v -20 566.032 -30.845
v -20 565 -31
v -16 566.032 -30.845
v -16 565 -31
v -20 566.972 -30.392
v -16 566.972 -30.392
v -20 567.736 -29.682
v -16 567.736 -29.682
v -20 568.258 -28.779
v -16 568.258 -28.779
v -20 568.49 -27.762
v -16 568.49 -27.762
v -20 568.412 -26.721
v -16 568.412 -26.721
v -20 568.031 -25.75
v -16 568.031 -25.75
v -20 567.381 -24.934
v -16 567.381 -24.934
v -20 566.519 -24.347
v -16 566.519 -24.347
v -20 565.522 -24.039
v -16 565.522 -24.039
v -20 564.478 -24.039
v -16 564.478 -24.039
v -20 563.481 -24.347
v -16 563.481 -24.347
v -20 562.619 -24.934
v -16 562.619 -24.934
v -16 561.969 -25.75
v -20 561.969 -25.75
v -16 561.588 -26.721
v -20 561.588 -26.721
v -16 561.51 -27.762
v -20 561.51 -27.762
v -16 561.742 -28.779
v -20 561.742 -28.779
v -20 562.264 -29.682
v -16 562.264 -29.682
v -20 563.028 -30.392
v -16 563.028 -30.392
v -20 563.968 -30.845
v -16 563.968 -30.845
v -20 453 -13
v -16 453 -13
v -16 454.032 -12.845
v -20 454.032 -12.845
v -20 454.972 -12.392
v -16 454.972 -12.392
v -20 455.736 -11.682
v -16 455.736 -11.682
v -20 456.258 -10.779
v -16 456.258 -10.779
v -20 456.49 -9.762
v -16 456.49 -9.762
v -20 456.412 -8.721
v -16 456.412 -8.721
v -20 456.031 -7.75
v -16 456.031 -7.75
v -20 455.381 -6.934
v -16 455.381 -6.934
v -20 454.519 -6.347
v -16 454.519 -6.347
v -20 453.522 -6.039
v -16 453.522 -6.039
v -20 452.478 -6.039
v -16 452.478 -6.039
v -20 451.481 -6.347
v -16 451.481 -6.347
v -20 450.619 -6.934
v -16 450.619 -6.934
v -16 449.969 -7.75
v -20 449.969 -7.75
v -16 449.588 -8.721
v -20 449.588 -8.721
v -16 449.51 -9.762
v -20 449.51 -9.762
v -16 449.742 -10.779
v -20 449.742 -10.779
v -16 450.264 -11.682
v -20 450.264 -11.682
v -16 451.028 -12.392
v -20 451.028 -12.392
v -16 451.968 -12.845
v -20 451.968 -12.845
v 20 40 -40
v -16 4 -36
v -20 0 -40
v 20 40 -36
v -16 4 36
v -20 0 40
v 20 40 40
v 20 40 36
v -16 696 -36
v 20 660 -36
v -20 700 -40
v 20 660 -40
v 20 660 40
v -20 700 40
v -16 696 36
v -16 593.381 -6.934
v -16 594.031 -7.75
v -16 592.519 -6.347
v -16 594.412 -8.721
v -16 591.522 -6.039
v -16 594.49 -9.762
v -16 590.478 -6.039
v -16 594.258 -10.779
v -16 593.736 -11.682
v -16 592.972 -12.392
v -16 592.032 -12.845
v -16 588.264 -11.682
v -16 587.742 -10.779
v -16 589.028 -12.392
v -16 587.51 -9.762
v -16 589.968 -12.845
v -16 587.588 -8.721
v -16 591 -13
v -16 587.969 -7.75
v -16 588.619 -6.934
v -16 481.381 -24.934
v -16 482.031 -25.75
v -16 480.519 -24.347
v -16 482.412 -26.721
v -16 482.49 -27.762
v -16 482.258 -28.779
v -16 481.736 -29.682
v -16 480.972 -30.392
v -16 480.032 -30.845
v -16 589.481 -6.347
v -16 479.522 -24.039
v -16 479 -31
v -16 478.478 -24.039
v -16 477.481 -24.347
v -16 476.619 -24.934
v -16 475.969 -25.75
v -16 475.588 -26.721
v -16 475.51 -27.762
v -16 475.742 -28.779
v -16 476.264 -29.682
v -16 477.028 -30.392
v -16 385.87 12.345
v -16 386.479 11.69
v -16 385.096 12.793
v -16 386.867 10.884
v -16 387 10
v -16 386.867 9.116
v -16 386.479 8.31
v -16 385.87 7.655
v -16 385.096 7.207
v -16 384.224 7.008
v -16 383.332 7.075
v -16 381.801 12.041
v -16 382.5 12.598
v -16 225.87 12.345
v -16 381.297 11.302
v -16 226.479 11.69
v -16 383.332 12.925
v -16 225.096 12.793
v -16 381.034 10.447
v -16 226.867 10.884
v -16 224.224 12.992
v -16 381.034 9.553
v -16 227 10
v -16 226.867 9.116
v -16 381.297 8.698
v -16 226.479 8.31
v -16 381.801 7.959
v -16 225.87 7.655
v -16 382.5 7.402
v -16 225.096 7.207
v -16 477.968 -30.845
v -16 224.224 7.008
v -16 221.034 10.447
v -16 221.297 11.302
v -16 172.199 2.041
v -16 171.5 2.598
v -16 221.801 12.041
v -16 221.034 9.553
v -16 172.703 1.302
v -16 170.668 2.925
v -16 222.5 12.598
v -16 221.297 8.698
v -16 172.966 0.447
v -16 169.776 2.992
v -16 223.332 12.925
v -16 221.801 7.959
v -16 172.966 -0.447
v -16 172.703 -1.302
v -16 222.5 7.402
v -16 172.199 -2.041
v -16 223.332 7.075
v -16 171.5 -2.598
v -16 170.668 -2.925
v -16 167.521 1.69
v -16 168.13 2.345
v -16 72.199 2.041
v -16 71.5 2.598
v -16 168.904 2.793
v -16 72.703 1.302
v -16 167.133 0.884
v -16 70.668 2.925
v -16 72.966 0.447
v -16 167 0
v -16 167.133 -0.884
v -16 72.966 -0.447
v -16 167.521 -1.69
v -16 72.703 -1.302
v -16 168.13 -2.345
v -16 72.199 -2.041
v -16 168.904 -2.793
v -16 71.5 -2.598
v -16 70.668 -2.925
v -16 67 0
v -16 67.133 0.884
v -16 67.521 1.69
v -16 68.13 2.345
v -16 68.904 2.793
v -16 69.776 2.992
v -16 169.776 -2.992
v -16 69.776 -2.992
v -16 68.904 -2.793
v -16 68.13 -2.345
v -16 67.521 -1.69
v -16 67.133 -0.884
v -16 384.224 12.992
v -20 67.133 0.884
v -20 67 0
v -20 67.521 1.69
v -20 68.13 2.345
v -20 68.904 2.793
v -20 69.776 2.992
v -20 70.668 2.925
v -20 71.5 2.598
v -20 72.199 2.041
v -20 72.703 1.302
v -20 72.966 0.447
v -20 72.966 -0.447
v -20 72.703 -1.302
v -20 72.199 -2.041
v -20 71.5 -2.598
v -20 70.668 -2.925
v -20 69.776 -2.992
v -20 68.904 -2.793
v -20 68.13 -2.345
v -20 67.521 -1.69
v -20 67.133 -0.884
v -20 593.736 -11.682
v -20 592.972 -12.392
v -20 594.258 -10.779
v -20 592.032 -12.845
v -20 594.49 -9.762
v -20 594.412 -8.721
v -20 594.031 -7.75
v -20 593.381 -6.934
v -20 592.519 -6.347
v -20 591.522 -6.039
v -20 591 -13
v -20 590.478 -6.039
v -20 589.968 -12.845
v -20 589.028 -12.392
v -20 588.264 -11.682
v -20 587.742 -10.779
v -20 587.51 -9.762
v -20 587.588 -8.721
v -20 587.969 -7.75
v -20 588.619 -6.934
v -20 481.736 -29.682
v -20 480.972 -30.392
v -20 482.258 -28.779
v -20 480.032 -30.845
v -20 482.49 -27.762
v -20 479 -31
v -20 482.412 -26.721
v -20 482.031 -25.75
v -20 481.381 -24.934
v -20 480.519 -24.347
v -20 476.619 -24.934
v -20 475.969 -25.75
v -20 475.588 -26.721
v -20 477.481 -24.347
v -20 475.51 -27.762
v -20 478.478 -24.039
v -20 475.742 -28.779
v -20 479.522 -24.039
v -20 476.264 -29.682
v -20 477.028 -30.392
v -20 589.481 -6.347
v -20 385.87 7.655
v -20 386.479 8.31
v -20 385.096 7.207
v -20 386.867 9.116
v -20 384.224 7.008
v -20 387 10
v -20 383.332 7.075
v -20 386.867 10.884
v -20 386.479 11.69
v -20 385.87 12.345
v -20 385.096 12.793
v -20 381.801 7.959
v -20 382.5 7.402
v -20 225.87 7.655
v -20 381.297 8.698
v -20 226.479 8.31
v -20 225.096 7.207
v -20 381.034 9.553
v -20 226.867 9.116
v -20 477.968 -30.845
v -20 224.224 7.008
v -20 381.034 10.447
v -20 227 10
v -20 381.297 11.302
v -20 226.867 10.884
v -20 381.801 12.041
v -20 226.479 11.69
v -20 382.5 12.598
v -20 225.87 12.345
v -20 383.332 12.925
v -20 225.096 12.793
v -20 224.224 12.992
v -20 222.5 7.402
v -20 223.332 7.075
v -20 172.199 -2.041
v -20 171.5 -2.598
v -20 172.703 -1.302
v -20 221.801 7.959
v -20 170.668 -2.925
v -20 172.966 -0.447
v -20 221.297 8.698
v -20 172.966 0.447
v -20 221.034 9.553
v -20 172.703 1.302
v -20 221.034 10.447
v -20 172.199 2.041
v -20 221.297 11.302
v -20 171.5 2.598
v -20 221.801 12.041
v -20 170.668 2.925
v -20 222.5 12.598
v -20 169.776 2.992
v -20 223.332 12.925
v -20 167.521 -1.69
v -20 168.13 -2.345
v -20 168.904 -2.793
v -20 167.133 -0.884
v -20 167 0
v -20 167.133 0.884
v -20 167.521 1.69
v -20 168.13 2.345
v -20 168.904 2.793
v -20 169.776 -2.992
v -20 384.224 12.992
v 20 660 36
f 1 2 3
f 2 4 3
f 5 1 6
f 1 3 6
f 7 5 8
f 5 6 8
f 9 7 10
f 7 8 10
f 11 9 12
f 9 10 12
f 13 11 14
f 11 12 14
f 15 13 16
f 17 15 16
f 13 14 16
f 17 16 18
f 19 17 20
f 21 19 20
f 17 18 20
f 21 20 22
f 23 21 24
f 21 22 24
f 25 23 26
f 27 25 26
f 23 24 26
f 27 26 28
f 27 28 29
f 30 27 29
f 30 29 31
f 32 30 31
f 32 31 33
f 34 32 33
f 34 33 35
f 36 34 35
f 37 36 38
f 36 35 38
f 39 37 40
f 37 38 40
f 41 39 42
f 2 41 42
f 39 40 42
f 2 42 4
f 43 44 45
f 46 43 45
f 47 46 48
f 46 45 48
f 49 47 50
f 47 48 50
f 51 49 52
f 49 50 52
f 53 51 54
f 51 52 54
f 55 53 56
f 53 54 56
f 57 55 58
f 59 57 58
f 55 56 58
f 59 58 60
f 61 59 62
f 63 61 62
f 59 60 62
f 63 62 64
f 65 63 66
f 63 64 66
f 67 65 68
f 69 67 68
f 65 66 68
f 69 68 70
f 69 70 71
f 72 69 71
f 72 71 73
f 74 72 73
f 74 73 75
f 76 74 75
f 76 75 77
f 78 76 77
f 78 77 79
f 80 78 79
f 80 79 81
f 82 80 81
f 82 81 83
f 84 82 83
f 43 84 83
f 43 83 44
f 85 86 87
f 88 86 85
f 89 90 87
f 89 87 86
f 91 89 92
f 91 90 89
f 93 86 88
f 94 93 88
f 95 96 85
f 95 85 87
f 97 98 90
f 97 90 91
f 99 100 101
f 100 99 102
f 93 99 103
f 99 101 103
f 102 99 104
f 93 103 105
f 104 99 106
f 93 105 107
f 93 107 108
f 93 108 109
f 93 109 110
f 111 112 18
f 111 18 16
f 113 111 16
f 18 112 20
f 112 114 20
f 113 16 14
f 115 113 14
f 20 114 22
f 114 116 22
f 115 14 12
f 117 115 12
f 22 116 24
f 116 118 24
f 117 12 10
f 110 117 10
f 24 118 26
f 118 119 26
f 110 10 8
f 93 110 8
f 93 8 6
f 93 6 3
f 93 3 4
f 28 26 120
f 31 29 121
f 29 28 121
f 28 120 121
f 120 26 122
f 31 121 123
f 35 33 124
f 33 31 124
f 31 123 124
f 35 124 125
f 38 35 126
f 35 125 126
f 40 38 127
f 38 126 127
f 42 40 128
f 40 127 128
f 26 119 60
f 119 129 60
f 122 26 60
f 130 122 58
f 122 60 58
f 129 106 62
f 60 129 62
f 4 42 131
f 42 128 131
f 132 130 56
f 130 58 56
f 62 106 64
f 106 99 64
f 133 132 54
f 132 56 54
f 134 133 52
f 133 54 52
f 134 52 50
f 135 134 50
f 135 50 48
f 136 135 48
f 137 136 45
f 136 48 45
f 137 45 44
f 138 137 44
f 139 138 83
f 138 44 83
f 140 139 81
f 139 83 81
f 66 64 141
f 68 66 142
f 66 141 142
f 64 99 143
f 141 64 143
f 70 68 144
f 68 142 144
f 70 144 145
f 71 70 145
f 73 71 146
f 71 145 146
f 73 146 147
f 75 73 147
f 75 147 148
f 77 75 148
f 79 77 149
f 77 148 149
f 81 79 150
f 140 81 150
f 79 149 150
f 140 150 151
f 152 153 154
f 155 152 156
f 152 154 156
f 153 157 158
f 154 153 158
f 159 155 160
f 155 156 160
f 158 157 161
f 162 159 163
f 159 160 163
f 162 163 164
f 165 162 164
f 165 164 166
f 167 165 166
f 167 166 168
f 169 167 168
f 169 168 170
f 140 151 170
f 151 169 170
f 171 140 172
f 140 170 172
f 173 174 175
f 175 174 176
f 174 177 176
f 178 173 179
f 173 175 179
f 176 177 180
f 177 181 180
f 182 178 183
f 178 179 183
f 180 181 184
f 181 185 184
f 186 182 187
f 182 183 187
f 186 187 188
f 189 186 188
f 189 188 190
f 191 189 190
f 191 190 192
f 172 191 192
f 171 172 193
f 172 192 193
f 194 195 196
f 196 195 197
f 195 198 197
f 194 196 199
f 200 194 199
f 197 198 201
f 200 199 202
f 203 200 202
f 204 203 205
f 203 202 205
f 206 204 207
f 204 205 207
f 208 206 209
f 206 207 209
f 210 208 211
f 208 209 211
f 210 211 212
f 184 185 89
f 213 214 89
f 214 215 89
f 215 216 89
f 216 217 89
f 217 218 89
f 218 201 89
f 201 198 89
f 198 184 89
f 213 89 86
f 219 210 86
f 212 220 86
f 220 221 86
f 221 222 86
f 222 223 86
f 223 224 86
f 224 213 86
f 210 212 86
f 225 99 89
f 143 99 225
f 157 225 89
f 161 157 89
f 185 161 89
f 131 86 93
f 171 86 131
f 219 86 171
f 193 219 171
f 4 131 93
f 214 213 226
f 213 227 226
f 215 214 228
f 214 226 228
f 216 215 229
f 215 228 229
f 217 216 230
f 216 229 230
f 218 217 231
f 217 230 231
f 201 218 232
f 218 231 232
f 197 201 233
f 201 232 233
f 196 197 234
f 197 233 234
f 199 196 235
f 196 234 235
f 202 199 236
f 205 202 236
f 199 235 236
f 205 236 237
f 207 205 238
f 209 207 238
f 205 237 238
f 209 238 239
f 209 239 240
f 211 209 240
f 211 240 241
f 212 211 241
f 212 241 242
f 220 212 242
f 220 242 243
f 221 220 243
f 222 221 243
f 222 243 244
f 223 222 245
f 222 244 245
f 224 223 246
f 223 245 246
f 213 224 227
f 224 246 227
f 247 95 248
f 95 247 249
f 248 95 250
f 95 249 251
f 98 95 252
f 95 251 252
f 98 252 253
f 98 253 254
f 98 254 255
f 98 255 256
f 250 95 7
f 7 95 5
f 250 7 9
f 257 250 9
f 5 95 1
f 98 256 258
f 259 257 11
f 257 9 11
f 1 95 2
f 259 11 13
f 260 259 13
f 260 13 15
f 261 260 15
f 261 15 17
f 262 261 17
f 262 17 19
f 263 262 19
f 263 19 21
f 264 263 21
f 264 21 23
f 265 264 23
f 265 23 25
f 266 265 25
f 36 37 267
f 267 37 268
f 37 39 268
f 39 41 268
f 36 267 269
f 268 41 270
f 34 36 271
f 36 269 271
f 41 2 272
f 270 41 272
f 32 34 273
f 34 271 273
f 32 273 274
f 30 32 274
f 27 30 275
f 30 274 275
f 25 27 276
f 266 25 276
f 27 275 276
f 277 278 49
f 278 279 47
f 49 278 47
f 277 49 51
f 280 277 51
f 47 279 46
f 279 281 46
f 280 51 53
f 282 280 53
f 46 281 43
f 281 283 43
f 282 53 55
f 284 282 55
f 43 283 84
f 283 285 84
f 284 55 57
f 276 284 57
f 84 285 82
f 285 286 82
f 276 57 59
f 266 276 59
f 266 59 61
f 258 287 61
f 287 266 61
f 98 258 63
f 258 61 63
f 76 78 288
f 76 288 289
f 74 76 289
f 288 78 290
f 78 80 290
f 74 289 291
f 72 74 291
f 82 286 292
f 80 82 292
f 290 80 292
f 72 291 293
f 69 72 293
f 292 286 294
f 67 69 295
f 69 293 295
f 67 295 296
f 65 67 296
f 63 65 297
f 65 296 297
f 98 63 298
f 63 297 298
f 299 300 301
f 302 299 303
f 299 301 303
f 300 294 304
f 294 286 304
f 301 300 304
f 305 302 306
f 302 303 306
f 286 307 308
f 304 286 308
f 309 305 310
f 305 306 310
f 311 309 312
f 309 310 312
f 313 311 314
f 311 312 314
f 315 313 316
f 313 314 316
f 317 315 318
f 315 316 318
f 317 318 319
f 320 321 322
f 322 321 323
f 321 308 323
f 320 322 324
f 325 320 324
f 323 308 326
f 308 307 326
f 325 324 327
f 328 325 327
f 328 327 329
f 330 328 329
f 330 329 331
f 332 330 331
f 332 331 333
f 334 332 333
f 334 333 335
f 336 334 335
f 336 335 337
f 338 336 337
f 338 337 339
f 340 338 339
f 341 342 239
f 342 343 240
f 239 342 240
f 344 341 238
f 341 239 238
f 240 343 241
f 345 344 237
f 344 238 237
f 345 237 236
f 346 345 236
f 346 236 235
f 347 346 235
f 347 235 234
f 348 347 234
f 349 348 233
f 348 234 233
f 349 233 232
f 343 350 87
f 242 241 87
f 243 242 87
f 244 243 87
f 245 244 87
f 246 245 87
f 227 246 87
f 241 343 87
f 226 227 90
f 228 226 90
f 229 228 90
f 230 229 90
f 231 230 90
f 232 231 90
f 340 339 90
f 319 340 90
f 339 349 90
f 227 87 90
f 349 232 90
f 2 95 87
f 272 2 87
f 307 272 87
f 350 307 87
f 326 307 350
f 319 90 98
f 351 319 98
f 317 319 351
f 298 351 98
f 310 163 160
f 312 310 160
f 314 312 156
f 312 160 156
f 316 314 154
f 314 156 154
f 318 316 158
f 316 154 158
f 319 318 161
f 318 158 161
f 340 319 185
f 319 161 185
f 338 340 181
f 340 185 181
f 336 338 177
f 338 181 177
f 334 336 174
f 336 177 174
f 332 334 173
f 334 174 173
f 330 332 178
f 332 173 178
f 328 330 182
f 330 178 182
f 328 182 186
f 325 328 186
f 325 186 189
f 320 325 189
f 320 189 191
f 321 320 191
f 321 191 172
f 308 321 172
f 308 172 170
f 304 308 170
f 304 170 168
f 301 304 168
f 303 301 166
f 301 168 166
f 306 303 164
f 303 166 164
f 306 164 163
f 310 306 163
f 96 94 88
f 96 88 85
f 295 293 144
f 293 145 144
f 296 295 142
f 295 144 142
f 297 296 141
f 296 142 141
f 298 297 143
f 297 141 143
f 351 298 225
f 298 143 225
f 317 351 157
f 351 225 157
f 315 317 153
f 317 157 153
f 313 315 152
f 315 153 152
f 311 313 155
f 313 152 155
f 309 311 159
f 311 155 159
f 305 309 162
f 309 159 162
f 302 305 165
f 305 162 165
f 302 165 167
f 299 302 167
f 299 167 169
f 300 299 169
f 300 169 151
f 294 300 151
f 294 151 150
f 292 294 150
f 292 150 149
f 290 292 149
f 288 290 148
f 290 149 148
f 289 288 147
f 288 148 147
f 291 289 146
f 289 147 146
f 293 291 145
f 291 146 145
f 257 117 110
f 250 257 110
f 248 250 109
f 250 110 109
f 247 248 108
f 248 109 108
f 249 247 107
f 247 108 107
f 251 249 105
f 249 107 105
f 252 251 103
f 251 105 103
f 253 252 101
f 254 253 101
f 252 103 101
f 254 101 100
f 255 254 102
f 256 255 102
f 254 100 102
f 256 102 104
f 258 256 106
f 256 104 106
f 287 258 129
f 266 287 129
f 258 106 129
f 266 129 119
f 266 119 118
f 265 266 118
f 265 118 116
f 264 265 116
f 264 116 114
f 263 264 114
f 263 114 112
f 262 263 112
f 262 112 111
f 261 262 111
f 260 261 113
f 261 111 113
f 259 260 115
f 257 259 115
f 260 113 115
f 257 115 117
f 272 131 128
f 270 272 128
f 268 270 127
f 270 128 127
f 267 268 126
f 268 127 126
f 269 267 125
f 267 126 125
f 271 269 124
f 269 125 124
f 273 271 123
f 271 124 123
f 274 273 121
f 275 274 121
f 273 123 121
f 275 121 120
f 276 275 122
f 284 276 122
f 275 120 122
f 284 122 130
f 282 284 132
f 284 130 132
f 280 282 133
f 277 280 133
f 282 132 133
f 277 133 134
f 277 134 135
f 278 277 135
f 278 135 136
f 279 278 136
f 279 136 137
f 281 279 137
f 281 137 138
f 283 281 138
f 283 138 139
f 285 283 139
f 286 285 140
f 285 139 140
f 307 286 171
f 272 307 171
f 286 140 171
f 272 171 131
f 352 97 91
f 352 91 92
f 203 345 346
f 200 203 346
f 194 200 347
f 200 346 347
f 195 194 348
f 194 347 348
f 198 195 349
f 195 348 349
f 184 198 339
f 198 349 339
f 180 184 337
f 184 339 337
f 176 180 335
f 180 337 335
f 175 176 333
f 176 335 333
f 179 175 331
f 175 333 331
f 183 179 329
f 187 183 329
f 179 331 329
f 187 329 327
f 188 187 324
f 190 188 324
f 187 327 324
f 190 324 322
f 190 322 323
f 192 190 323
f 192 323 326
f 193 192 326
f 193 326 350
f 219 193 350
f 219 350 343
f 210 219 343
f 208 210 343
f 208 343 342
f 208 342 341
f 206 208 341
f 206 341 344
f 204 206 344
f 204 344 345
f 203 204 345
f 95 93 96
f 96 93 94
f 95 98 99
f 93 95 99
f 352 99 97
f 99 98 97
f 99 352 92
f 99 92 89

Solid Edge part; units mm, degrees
sketch "Sketch1" plane through (0, 0, 0) normal (0, -1, 0) x (1, 0, 0)
  line L0 (20, 36) -> (-16, 36)
  line L1 (-16, 36) -> (-16, -36)
  line L2 (-16, -36) -> (20, -36)
  line L3 (20, -36) -> (20, -40)
  line L4 (20, -40) -> (-20, -40)
  line L5 (-20, -40) -> (-20, 40)
  line L6 (-20, 40) -> (20, 40)
  line L7 (20, 40) -> (20, 36)
  dimension "D1" = 40
  dimension "D2" = 4
  dimension "D3" = 4
  dimension "D4" = 80
  dimension "D5" = 4
extrude "Protrusion1" add sketch "Sketch1" against normal blind 700
sketch "Sketch2" plane through (0, 350, 40) normal (0, 0, 1) x (0, 1, 0)
  line L0 (-350, 20) -> (-310, -20)
extrude "Cutout1" cut sketch "Sketch2" against normal through all material side at (0.0354, 19.9646, 40)
sketch "Sketch3" plane through (0, 350, 40) normal (0, 0, 1) x (0, 1, 0)
  line L0 (350, 20) -> (310, -20)
extrude "Cutout2" cut sketch "Sketch3" against normal through all material side at (0.0354, 680.0354, 40)
sketch "Sketch4" plane through (-16, 350, 0) normal (1, 0, 0) x (0, 1, 0)
  circle A0 centre (-126, 10) radius 3
  circle A1 centre (34, 10) radius 3
  dimension "D1" = 6
  dimension "D2" = 160
  dimension "D3" = 50
  dimension "D4" = 316
extrude "Cutout3" cut sketch "Sketch4" against normal through all
hole "Bohrung_1" at (-16, 591, -9.5) direction (-1, 0, 0) diameter 7 end up to next
hole "Hole1" at (-16, 565, -27.5) direction (-1, 0, 0) diameter 7 end up to next
hole "Hole2" at (-16, 453, -9.5) direction (-1, 0, 0) diameter 7 end up to next
hole "Hole3" at (-16, 479, -27.5) direction (-1, 0, 0) diameter 7 end up to next
sketch "Sketch5" plane through (-20, 350, 0) normal (-1, 0, 0) x (0, -1, 0)
  circle A0 centre (280, 0) radius 3
  circle A1 centre (180, 0) radius 3
  dimension "D1" = 6
  dimension "D2" = 100
  dimension "D3" = 70
  dimension "D4" = 40
extrude "Cutout4" cut sketch "Sketch5" against normal through all
properties part number "A1.1.M1" material "AlMgSi 0,5-1"
